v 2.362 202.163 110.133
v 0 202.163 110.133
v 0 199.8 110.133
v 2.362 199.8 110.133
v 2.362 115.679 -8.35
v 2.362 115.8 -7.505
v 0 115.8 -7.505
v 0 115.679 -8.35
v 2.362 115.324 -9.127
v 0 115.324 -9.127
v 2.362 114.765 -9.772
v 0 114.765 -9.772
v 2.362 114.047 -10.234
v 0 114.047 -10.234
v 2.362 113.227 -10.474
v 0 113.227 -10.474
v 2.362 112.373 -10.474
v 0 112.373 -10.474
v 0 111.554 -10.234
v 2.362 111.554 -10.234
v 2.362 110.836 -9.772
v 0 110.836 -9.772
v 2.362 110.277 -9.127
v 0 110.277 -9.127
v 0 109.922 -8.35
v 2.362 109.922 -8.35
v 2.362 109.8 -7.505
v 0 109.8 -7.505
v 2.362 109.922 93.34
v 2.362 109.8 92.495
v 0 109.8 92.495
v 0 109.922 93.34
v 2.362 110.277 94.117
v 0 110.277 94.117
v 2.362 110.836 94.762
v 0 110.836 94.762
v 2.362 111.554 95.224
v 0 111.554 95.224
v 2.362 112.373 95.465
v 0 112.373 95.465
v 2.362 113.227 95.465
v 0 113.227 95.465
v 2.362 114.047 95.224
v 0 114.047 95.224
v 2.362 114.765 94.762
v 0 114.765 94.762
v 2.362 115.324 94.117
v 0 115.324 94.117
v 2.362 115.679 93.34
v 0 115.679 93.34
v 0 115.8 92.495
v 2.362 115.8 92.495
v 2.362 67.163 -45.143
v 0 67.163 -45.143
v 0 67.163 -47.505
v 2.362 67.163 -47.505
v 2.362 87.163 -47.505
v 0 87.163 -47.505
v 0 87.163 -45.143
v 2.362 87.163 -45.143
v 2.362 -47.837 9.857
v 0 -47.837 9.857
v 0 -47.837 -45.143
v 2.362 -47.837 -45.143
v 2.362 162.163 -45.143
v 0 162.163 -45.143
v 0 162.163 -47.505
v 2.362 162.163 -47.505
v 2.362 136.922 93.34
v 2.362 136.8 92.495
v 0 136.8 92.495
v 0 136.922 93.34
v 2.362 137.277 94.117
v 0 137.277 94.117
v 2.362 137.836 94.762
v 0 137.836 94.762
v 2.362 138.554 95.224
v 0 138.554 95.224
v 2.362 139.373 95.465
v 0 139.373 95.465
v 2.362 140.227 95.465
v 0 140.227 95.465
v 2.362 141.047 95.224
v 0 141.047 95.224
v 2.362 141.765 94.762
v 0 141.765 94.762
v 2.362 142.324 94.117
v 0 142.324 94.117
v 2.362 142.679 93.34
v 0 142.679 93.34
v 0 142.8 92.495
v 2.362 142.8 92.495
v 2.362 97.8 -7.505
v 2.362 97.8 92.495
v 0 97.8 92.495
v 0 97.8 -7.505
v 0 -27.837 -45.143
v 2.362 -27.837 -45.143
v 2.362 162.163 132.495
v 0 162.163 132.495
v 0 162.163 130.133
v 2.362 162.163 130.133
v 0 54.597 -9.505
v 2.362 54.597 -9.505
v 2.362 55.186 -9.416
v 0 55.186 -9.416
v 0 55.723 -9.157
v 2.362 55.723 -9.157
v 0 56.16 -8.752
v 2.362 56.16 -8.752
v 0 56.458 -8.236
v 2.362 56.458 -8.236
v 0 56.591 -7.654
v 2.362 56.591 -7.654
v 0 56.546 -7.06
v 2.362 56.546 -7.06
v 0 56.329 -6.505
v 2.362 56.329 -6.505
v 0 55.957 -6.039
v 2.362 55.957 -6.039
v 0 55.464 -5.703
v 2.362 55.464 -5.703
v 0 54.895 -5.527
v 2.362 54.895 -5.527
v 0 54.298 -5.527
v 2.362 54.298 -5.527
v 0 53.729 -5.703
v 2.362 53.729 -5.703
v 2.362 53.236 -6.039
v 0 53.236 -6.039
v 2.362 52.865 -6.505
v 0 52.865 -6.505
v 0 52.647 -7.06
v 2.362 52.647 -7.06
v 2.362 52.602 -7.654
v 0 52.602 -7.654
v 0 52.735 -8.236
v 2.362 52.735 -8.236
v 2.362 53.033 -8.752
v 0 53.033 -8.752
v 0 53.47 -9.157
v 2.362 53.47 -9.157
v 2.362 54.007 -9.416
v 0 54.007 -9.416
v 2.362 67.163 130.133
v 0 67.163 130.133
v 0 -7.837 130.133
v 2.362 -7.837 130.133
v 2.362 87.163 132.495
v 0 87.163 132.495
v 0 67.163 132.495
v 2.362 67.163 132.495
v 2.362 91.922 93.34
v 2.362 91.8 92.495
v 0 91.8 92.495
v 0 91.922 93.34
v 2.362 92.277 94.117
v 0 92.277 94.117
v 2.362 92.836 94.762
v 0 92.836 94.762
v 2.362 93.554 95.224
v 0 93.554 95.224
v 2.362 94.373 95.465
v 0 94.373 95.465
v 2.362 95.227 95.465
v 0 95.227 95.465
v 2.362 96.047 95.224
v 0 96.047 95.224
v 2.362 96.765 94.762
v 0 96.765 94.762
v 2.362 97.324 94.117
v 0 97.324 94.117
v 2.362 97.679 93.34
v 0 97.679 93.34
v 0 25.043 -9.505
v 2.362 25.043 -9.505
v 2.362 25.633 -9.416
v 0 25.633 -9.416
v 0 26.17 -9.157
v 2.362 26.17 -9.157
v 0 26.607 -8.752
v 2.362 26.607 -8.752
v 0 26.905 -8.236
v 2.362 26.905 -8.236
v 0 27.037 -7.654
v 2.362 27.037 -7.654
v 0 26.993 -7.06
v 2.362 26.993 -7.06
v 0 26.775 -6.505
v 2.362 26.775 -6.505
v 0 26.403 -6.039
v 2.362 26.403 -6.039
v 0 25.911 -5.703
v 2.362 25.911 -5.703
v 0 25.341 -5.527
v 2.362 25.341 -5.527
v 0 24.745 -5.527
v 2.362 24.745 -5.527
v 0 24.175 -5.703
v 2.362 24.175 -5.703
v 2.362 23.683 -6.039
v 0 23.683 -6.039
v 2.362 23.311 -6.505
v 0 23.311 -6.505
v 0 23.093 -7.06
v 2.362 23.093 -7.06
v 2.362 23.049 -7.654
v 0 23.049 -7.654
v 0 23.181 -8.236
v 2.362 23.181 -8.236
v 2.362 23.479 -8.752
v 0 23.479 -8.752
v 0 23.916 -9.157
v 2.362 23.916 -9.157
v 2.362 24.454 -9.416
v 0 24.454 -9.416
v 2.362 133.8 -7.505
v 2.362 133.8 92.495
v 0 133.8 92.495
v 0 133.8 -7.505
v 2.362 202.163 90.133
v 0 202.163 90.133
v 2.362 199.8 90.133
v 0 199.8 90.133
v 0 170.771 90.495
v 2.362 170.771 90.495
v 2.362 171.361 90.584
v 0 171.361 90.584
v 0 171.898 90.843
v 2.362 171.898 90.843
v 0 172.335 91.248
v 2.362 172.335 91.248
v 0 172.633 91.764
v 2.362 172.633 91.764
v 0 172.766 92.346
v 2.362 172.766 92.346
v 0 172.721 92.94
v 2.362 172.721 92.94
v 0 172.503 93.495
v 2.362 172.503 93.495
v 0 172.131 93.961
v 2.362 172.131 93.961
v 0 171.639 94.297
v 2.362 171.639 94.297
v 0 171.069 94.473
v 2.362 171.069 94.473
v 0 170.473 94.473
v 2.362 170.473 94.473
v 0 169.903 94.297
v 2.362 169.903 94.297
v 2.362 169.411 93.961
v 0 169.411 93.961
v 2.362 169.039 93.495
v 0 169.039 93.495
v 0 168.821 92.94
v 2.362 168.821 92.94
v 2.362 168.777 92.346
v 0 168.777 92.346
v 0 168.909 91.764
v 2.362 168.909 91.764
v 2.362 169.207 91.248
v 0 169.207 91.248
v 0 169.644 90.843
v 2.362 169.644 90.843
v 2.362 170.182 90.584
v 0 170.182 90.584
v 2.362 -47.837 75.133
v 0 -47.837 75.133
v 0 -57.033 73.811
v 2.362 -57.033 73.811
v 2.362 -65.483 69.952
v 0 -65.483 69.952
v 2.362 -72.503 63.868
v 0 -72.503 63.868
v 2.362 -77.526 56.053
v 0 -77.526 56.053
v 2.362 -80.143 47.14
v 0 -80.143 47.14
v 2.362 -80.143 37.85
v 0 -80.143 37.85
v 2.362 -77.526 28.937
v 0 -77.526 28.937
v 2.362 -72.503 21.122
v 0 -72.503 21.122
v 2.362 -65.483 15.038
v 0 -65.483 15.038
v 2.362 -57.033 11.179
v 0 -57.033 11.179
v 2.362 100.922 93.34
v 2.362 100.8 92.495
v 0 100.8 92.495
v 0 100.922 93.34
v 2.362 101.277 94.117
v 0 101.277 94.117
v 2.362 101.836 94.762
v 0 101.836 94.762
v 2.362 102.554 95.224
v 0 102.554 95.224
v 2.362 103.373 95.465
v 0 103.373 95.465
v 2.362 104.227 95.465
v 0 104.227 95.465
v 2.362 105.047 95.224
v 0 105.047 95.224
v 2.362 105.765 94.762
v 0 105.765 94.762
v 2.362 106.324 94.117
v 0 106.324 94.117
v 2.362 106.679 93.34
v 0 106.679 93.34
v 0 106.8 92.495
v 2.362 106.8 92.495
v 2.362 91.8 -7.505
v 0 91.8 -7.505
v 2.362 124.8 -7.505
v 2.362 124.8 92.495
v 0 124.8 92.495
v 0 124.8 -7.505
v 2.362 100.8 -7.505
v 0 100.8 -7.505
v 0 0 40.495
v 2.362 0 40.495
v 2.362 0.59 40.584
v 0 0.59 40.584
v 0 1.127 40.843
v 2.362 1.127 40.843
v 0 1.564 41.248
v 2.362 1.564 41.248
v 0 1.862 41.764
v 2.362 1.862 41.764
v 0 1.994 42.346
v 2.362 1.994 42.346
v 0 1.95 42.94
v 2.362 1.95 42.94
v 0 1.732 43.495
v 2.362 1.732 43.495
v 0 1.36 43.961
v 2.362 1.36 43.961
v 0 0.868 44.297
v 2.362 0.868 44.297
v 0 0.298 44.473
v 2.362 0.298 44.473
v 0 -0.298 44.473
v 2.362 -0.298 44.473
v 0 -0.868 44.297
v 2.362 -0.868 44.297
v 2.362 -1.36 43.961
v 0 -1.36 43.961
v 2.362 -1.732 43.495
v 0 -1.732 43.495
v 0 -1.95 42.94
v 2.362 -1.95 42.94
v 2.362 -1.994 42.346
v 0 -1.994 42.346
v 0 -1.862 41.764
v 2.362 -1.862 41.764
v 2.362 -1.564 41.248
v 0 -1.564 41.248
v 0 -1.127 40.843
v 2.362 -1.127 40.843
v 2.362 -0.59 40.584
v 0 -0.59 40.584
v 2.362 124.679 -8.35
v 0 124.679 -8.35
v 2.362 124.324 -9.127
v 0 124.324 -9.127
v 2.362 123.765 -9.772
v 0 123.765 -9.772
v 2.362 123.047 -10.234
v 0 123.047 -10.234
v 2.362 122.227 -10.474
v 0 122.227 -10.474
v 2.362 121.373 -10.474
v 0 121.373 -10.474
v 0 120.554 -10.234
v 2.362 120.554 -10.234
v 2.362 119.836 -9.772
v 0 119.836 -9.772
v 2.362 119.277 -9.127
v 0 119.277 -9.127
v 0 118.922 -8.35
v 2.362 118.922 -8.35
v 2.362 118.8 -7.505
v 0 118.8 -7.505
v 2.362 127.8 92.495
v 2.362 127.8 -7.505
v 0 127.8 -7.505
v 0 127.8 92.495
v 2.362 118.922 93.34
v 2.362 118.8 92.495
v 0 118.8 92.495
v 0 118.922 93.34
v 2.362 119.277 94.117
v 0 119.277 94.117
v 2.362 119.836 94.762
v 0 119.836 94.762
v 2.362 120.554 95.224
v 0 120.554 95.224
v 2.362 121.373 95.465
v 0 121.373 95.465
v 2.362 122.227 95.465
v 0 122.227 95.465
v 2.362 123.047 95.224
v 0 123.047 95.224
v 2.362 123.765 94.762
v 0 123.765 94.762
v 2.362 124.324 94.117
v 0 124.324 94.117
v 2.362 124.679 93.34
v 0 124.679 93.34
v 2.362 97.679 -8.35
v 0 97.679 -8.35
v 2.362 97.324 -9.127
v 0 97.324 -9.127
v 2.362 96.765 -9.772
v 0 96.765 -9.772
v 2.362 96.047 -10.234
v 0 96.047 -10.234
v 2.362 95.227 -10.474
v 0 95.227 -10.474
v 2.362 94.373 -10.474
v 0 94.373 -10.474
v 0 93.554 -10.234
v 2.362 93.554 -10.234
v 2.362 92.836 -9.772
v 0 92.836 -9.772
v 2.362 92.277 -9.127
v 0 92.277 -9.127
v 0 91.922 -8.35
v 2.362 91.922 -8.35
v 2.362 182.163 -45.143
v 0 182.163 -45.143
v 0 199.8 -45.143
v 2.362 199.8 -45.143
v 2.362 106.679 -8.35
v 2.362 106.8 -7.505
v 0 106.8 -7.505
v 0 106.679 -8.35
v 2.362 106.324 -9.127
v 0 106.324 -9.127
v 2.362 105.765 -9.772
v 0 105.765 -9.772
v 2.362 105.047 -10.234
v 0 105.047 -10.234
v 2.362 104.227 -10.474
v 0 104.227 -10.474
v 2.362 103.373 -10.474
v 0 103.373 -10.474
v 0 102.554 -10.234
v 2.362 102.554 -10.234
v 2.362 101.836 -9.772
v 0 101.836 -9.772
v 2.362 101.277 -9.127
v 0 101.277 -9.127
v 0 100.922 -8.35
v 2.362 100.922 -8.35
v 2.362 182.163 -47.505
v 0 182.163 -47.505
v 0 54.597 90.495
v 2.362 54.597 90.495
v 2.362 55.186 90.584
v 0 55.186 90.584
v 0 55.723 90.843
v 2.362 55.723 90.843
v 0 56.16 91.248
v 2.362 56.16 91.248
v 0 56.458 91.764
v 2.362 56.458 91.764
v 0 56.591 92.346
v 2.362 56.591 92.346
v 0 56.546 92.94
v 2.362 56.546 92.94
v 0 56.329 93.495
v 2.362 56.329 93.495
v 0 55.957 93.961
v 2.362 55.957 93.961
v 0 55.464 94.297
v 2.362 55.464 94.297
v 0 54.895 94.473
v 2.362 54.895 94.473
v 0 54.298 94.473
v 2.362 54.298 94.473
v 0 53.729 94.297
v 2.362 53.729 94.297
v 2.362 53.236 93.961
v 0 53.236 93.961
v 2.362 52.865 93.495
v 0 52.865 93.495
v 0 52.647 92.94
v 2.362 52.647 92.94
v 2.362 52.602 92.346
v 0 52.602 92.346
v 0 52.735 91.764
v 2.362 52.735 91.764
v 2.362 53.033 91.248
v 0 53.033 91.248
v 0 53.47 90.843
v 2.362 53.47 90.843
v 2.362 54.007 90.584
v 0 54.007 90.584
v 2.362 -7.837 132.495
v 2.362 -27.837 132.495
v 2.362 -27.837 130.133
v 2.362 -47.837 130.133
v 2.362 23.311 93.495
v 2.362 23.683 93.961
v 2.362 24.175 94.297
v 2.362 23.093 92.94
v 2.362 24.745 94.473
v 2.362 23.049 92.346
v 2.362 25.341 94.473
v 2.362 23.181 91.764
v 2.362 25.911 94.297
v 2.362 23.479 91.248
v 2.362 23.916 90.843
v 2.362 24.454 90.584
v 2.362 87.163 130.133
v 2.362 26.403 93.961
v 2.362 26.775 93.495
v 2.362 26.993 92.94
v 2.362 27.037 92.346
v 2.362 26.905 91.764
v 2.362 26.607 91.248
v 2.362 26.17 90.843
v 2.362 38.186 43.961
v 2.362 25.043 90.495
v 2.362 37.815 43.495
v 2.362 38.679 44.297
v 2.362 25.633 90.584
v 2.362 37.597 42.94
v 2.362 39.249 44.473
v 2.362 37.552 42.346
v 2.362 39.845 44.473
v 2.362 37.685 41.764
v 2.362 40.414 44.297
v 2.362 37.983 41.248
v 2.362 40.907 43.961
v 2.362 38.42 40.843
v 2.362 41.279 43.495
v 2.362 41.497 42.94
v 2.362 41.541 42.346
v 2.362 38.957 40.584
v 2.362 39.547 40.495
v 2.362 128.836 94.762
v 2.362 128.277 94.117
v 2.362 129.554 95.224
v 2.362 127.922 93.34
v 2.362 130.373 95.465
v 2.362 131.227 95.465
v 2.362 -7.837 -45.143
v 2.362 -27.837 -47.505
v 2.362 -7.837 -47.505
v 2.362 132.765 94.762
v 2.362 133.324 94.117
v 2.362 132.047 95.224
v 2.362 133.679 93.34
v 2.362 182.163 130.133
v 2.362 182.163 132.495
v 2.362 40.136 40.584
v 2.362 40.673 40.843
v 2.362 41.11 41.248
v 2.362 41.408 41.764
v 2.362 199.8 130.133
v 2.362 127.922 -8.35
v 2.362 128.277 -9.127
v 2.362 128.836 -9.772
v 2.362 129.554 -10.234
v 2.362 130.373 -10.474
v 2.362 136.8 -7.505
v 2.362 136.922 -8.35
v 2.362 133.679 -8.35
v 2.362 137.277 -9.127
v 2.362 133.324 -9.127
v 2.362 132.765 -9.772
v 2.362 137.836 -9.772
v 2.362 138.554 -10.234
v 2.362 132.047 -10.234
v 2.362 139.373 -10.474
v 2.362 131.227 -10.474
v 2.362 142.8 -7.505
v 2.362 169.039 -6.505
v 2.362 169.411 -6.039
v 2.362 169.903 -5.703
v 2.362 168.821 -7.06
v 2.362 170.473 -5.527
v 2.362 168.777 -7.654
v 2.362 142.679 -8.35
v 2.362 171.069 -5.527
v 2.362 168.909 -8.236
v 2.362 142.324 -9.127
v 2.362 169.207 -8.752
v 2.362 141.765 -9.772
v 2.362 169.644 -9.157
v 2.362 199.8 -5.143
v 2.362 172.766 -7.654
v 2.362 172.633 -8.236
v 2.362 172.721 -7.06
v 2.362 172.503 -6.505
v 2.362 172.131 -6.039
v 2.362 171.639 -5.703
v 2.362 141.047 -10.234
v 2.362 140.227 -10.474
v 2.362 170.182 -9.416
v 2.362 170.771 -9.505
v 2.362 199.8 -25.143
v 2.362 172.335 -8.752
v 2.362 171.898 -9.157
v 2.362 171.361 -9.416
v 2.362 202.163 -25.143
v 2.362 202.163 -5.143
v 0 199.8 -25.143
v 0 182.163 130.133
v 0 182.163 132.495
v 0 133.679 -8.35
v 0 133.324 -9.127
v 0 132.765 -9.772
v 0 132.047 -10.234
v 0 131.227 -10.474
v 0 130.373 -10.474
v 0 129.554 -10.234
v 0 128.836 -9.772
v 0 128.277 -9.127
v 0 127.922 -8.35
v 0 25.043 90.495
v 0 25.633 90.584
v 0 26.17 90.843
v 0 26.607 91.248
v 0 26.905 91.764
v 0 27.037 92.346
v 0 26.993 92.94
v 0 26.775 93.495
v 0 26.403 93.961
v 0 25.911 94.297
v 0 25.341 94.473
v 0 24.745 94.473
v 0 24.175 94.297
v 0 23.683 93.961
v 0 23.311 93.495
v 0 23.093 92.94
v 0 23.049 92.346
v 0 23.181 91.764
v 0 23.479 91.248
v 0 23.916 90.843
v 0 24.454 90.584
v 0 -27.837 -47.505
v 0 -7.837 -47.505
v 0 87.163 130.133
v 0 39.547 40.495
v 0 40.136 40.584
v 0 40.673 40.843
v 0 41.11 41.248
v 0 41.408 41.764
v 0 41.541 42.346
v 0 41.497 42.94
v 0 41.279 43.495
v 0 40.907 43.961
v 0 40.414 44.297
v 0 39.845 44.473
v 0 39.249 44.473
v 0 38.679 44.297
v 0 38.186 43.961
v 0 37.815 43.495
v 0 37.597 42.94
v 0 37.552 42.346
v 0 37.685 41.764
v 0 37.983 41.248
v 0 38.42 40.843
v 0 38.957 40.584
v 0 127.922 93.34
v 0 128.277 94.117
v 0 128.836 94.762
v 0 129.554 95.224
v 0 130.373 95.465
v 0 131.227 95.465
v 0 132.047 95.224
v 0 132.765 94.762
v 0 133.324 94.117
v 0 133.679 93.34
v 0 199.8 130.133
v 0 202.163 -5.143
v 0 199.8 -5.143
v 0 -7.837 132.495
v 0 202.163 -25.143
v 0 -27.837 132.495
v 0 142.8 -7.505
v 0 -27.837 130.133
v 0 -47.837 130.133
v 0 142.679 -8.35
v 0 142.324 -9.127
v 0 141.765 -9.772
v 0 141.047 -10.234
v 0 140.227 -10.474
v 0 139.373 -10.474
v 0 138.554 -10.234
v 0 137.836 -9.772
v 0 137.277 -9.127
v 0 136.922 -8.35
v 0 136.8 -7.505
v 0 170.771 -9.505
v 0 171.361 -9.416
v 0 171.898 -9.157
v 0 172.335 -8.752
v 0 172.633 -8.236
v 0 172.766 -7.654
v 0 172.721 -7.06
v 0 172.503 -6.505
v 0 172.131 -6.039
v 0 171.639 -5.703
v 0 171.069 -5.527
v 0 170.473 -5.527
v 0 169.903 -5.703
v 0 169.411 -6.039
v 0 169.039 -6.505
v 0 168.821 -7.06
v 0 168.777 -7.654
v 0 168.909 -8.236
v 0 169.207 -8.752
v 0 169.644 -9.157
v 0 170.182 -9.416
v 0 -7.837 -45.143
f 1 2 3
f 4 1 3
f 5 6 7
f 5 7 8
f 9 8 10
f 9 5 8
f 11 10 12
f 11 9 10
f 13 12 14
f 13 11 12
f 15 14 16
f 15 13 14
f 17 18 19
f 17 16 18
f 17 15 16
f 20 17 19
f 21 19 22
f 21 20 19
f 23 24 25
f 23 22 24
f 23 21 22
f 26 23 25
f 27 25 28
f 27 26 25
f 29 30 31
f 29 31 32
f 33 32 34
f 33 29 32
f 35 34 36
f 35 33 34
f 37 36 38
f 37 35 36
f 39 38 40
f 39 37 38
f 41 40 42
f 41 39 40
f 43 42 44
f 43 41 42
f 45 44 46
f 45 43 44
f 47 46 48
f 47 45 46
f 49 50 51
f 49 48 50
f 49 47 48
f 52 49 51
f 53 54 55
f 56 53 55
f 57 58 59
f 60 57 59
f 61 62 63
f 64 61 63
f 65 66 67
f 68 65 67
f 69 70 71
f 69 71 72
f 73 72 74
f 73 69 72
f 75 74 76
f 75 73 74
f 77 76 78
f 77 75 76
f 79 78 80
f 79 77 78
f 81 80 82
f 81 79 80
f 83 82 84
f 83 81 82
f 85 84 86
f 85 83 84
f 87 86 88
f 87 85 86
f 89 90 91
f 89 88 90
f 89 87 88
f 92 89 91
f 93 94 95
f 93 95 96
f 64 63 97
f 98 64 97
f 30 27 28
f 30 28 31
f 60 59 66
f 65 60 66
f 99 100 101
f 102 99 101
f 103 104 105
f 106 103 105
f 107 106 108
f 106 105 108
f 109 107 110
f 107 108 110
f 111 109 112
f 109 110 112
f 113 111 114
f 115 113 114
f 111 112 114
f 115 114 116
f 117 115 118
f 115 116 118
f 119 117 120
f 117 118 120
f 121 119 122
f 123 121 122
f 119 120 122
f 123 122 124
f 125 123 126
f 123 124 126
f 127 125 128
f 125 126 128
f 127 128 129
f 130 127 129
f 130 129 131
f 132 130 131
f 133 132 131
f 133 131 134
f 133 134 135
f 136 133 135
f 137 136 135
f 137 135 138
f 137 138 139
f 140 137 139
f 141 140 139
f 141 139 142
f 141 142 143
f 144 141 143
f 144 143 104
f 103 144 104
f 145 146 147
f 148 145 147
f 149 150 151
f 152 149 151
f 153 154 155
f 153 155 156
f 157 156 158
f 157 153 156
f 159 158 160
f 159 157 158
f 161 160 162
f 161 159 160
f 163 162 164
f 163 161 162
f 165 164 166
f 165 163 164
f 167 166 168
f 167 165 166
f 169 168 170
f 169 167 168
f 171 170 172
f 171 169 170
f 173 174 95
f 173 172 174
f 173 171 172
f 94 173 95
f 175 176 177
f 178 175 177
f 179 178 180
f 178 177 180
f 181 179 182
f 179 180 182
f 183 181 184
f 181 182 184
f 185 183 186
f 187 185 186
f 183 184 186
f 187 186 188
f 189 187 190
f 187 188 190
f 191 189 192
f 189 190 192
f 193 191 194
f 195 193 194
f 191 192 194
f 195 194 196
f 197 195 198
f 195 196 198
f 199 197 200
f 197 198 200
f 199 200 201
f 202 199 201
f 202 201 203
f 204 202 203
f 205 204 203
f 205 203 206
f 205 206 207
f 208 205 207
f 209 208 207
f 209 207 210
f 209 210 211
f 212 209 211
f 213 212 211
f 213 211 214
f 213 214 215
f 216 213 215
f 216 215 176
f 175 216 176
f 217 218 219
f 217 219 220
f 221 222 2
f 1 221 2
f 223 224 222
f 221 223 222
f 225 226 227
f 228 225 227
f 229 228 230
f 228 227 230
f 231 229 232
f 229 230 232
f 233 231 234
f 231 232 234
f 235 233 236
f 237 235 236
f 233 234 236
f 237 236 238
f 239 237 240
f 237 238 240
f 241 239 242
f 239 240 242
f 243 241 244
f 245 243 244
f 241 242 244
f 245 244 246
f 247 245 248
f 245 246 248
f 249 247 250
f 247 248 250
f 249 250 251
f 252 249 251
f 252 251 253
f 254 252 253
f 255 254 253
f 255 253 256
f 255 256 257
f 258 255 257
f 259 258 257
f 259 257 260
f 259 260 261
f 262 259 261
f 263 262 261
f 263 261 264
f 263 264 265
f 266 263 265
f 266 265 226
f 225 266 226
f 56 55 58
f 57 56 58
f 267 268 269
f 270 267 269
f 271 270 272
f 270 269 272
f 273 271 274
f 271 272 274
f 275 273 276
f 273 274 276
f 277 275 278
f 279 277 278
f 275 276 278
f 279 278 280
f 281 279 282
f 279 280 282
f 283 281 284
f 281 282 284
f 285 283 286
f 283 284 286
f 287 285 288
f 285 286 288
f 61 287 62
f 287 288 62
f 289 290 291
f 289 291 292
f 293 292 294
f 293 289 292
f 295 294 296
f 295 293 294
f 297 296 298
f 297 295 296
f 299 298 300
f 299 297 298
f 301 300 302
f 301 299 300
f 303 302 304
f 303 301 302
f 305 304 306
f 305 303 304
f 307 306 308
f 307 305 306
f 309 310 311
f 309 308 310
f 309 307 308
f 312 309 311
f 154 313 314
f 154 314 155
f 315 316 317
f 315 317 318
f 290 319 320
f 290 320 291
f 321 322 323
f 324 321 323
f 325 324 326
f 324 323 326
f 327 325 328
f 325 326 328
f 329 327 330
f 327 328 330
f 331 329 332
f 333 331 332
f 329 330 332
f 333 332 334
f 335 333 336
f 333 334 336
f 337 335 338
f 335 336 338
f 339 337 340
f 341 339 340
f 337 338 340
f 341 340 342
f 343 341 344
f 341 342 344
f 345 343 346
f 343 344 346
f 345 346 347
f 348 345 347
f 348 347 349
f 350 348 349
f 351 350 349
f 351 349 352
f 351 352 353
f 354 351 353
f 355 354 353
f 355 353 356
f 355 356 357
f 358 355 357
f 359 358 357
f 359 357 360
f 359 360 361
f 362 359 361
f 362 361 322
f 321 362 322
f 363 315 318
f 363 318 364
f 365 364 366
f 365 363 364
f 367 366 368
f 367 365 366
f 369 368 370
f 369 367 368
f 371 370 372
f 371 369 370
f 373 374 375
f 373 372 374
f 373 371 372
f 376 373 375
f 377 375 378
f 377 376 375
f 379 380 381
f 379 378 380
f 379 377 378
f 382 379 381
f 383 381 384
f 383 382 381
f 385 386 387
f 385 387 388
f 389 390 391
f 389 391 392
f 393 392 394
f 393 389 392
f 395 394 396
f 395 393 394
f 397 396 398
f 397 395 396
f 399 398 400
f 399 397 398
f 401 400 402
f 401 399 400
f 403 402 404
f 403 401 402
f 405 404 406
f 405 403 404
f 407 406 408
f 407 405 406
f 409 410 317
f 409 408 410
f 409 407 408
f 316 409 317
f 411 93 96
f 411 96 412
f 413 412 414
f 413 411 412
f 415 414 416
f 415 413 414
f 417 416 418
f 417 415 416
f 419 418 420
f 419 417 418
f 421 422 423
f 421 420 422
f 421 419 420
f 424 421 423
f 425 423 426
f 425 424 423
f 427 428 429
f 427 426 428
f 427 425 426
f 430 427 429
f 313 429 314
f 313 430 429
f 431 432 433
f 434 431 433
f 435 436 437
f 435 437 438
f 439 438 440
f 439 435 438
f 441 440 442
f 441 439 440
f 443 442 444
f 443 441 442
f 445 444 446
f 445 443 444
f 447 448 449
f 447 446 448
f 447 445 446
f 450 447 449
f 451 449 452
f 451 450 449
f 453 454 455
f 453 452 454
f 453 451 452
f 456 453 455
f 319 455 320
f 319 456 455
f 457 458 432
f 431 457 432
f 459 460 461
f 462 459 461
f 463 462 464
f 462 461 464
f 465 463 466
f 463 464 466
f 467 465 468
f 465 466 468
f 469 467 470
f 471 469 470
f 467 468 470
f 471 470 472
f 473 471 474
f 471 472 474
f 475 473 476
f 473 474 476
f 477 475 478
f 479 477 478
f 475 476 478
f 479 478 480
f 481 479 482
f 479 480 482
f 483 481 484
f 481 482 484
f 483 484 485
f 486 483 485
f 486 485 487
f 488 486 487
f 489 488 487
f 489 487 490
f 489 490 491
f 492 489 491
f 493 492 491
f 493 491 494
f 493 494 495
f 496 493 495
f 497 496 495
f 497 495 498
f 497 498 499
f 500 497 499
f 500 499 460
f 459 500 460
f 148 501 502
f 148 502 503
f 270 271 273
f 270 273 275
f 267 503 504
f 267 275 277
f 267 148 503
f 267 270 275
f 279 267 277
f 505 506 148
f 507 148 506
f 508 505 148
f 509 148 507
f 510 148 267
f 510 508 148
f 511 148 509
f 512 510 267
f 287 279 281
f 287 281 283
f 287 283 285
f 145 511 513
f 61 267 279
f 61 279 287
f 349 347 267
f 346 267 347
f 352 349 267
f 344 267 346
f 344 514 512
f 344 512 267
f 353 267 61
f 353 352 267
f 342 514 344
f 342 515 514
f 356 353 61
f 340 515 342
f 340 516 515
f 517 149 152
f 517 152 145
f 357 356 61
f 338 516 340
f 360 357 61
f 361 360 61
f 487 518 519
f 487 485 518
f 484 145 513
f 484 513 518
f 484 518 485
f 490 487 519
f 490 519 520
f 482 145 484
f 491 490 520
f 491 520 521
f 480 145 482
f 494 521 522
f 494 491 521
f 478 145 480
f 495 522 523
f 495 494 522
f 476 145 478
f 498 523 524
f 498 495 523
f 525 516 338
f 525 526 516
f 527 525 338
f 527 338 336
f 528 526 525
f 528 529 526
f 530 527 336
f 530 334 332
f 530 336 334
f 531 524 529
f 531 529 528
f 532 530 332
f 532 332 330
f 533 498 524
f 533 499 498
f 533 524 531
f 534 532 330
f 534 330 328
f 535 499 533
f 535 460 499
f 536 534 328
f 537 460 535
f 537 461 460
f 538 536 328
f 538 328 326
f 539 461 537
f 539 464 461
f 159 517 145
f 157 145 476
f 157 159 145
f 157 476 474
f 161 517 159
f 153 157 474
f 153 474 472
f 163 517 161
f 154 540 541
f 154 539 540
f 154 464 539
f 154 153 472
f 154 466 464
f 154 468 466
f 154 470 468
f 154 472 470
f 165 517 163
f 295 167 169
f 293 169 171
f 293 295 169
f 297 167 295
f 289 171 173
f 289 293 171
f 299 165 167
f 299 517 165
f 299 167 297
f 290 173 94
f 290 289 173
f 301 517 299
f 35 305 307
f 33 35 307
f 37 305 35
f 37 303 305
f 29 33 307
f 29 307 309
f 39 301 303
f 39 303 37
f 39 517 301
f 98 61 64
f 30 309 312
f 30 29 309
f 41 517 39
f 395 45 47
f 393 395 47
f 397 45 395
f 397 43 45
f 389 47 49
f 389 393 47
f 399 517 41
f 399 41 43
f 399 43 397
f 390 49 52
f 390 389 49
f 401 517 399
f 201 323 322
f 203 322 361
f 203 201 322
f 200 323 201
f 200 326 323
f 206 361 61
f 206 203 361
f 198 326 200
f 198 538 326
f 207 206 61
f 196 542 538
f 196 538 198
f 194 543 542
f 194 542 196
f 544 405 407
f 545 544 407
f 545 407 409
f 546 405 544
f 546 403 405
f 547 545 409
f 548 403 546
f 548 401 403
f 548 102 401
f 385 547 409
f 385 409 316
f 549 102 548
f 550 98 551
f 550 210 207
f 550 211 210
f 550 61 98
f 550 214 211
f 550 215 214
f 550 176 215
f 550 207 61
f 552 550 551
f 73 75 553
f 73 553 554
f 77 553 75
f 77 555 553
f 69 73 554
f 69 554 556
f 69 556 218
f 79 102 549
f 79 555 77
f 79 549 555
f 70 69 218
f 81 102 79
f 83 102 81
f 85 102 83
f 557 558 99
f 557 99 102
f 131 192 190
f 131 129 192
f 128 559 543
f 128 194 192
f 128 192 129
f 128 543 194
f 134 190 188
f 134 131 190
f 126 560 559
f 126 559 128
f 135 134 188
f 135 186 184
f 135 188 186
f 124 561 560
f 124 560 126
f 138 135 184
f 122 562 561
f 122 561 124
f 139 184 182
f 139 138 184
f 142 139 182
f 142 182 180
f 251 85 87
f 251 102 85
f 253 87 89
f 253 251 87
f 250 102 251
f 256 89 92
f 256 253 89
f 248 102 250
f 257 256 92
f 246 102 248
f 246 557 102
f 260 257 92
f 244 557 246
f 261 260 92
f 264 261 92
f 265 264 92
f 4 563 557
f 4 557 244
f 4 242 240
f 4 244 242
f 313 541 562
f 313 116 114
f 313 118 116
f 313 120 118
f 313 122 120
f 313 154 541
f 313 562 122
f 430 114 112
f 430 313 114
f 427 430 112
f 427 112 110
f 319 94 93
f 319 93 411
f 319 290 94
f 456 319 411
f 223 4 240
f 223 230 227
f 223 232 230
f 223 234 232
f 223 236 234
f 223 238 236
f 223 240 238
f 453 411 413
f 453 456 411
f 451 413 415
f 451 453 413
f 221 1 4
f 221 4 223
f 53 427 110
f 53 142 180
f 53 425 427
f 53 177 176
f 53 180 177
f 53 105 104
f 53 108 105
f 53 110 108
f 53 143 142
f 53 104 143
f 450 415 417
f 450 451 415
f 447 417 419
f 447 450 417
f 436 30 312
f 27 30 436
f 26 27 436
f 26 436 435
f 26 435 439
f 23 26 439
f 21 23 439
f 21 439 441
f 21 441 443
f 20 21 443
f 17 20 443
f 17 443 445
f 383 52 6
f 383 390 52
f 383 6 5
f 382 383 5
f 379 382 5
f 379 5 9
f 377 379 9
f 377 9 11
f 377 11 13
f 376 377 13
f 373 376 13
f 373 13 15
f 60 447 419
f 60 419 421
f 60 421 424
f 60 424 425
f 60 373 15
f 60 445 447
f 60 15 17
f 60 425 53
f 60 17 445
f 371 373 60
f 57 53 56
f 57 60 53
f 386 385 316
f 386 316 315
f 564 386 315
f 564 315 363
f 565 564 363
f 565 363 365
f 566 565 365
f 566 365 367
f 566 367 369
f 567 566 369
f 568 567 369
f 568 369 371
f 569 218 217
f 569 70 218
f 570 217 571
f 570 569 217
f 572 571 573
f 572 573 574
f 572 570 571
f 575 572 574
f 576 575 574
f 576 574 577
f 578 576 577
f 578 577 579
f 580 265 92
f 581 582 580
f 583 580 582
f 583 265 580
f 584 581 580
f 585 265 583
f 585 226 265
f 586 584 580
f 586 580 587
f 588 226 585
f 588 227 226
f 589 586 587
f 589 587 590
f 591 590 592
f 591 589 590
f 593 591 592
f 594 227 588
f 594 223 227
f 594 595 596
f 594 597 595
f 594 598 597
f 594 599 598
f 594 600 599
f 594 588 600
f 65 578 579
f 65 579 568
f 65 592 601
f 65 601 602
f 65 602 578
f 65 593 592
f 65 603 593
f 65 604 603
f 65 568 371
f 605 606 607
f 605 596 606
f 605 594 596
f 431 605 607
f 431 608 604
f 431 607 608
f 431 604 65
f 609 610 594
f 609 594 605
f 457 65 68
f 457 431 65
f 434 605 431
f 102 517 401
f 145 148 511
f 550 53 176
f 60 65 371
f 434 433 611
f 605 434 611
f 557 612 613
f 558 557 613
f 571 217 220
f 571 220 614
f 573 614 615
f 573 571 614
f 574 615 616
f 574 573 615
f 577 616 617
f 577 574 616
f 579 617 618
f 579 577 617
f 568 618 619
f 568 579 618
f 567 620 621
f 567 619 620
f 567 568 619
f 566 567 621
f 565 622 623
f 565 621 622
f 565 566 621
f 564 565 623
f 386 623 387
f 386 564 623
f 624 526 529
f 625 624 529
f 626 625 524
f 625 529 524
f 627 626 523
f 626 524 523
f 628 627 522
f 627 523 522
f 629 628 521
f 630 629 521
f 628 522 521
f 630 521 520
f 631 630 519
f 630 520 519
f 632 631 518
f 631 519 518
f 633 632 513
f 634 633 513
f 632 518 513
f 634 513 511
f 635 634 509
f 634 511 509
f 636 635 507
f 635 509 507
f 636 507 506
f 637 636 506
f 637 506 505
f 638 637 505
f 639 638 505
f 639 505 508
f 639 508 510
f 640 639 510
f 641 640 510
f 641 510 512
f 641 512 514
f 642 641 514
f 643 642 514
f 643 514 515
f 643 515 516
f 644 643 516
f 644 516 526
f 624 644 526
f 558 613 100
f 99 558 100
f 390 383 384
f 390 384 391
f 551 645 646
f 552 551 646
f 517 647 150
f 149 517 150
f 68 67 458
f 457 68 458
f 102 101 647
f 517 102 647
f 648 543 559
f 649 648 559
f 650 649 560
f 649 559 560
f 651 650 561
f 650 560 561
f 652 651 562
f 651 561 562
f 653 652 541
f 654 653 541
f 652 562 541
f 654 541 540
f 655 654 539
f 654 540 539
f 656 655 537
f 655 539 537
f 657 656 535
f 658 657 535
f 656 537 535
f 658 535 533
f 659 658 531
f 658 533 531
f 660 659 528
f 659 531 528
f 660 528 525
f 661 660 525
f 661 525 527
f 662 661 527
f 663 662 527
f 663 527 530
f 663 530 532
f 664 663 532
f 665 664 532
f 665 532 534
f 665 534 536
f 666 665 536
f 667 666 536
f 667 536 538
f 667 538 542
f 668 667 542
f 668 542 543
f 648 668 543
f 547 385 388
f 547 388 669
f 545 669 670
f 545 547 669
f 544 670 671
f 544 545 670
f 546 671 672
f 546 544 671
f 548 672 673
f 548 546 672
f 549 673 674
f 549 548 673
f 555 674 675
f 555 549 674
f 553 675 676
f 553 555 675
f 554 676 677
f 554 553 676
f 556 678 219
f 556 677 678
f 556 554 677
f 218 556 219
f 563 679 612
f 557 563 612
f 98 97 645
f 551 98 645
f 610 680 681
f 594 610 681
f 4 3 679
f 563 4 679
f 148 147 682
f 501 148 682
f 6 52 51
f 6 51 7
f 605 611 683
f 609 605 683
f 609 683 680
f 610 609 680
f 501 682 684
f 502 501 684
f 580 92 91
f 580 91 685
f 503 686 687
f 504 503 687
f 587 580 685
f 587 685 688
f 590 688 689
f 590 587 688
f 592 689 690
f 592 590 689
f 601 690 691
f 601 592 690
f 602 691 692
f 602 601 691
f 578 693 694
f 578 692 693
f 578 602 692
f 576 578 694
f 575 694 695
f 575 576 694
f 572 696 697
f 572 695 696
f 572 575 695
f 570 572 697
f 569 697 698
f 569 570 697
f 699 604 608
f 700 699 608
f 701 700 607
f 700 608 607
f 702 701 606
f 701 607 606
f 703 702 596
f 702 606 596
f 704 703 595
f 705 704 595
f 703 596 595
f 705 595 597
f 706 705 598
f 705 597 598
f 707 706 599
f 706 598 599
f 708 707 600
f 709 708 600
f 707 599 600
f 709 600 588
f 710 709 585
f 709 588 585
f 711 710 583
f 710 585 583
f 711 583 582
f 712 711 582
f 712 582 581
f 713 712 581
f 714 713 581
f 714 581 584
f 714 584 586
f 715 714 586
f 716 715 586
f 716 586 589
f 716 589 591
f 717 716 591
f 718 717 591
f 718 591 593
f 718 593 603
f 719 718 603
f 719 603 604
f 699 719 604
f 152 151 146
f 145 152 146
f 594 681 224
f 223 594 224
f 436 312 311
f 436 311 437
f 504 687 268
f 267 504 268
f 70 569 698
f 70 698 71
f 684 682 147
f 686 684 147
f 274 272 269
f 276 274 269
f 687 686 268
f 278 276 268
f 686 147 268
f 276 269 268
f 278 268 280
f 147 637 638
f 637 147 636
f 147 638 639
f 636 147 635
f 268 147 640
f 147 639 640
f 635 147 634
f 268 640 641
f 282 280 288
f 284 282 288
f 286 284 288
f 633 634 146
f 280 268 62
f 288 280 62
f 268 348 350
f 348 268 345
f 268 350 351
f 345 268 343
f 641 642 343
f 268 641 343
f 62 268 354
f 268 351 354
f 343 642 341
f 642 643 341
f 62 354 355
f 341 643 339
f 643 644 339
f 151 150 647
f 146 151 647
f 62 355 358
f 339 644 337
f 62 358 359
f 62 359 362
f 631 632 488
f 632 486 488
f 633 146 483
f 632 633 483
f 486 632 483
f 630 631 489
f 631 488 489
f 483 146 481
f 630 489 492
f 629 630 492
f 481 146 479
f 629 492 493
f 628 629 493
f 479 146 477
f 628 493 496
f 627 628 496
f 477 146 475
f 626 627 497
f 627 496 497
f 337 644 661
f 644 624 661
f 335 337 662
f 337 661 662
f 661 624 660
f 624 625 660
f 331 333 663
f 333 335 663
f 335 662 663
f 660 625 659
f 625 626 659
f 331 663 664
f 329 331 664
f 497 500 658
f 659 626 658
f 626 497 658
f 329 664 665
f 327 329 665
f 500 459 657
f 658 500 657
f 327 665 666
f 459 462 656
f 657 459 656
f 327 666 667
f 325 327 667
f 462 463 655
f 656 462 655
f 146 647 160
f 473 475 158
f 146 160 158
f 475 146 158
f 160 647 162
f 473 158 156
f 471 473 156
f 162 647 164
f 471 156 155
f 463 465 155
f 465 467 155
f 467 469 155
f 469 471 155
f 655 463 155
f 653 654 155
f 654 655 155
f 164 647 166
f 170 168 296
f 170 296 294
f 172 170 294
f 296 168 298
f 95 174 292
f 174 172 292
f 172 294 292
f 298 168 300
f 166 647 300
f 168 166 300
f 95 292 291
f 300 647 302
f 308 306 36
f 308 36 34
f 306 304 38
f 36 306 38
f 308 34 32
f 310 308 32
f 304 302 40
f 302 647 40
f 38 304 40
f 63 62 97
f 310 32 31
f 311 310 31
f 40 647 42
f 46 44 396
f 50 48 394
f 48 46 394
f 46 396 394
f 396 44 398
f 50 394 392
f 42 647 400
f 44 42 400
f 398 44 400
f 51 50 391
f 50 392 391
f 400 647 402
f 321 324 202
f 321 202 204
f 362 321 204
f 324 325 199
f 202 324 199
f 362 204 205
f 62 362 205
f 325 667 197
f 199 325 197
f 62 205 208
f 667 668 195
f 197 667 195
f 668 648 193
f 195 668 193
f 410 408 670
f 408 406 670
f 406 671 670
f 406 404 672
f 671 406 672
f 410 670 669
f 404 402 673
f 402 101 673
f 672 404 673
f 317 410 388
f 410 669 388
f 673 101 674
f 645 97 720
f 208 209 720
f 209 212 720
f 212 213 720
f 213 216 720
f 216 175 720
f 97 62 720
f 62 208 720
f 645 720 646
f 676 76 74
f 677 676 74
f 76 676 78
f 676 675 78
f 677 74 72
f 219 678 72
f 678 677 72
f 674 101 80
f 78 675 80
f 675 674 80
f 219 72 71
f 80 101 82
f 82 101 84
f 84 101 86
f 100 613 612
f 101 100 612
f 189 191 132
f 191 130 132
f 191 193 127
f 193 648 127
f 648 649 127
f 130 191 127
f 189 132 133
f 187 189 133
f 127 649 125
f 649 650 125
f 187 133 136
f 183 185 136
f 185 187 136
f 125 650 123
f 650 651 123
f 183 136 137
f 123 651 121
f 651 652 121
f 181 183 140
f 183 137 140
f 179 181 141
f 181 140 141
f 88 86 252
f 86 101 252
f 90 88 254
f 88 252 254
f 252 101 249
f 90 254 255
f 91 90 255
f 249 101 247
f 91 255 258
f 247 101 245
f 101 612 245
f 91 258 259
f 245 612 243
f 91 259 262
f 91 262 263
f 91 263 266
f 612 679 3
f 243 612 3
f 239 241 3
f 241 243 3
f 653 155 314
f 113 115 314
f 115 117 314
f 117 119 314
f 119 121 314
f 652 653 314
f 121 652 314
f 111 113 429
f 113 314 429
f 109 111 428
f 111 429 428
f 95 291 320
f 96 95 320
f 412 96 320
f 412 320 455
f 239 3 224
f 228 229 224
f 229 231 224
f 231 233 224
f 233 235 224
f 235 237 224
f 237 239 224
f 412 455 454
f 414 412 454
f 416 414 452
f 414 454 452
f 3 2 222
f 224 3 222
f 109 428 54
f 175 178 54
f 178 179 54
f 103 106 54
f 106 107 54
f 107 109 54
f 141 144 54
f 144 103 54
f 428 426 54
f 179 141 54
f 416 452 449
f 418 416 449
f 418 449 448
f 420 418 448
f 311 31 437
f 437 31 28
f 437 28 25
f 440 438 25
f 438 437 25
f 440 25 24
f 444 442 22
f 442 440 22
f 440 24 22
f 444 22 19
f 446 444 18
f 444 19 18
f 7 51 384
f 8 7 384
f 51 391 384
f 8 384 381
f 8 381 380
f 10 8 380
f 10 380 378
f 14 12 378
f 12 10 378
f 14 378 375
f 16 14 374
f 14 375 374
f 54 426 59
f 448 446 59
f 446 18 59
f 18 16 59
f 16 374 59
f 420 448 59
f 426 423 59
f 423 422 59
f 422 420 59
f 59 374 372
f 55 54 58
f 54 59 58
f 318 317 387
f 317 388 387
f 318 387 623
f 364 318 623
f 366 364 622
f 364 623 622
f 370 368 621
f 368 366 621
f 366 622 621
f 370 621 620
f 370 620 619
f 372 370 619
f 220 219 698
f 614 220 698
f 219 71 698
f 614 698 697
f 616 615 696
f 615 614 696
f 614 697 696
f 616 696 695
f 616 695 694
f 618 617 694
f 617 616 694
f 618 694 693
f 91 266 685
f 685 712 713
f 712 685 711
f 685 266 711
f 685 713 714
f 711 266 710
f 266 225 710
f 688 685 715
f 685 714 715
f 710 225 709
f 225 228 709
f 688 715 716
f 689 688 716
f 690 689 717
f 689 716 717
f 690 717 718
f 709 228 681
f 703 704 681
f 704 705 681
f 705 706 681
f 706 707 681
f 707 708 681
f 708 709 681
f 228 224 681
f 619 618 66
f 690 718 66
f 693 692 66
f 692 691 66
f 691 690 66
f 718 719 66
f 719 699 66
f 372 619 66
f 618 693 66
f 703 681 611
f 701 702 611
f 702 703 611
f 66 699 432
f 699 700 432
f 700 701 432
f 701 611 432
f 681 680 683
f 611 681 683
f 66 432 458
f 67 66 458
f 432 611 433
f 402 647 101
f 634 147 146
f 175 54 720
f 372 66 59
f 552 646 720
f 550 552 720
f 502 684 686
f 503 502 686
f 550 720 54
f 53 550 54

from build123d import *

# Parameters (mm, degrees)
BOSS_EXTRUDE1_DEPTH = 2.3622
SKETCH2_R           = 2
CUT_EXTRUDE1_DEPTH  = 242.723455562


with BuildPart() as part:
    # Sketch1 → Boss-Extrude1 (new body)
    with BuildSketch(Plane(origin=(0, 0, 0), x_dir=(0, 0, -1), z_dir=(1, 0, 0))):
        with BuildLine():
            Line((-130.13293856, 199.80032679), (-130.13293856, 182.16252679))
            Line((-130.13293856, 182.16252679), (-132.49513856, 182.16252679))
            Line((-132.49513856, 182.16252679), (-132.49513856, 162.16252679))
            Line((-132.49513856, 162.16252679), (-130.13293856, 162.16252679))
            Line((-130.13293856, 162.16252679), (-130.13293856, 87.16252679))
            Line((-130.13293856, 87.16252679), (-132.49513856, 87.16252679))
            Line((-132.49513856, 87.16252679), (-132.49513856, 67.16252679))
            Line((-132.49513856, 67.16252679), (-130.13293856, 67.16252679))
            Line((-130.13293856, 67.16252679), (-130.13293856, -7.83747321))
            Line((-130.13293856, -7.83747321), (-132.49513856, -7.83747321))
            Line((-132.49513856, -7.83747321), (-132.49513856, -27.83747321))
            Line((-132.49513856, -27.83747321), (-130.13293856, -27.83747321))
            Line((-130.13293856, -27.83747321), (-130.13293856, -47.83747321))
            Line((-130.13293856, -47.83747321), (-75.13293856, -47.83747321))
            ThreePointArc((-75.13293856, -47.83747321), (-42.49513856, -80.47527321), (-9.85733856, -47.83747321))
            Line((-9.85733856, -47.83747321), (45.14266144, -47.83747321))
            Line((45.14266144, -47.83747321), (45.14266144, -27.83747321))
            Line((45.14266144, -27.83747321), (47.50486144, -27.83747321))
            Line((47.50486144, -27.83747321), (47.50486144, -7.83747321))
            Line((47.50486144, -7.83747321), (45.14266144, -7.83747321))
            Line((45.14266144, -7.83747321), (45.14266144, 67.16252679))
            Line((45.14266144, 67.16252679), (47.50486144, 67.16252679))
            Line((47.50486144, 67.16252679), (47.50486144, 87.16252679))
            Line((47.50486144, 87.16252679), (45.14266144, 87.16252679))
            Line((45.14266144, 87.16252679), (45.14266144, 162.16252679))
            Line((45.14266144, 162.16252679), (47.50486144, 162.16252679))
            Line((47.50486144, 162.16252679), (47.50486144, 182.16252679))
            Line((47.50486144, 182.16252679), (45.14266144, 182.16252679))
            Line((45.14266144, 182.16252679), (45.14266144, 199.80032679))
            Line((45.14266144, 199.80032679), (25.14266144, 199.80032679))
            Line((25.14266144, 199.80032679), (25.14266144, 202.16252679))
            Line((25.14266144, 202.16252679), (5.14266144, 202.16252679))
            Line((5.14266144, 202.16252679), (5.14266144, 199.80032679))
            Line((5.14266144, 199.80032679), (-90.13293856, 199.80032679))
            Line((-90.13293856, 199.80032679), (-90.13293856, 202.16252679))
            Line((-90.13293856, 202.16252679), (-110.13293856, 202.16252679))
            Line((-110.13293856, 202.16252679), (-110.13293856, 199.80032679))
            Line((-110.13293856, 199.80032679), (-130.13293856, 199.80032679))
        make_face()
    extrude(amount=BOSS_EXTRUDE1_DEPTH)

    # Sketch2 → Cut-Extrude1 (cut, through all)
    with BuildSketch(Plane(origin=(2.3622, 0, 0), x_dir=(0, 0, -1), z_dir=(1, 0, 0))):
        with Locations((-92.49513856, 54.59655139)):
            Circle(SKETCH2_R)
        with Locations((7.50486144, 54.59655139)):
            Circle(SKETCH2_R)
        with Locations((7.50486144, 25.043037435)):
            Circle(SKETCH2_R)
        with Locations((-92.49513856, 170.771110124)):
            Circle(SKETCH2_R)
        with Locations((7.50486144, 170.771110124)):
            Circle(SKETCH2_R)
        with Locations((-92.49513856, 25.043037435)):
            Circle(SKETCH2_R)
        with Locations((-42.49513856, 39.546662347)):
            Circle(SKETCH2_R)
        with Locations((-42.49513856, 0)):
            Circle(SKETCH2_R)
        with BuildLine():
            Line((-92.49513856, 142.80032679), (7.50486144, 142.80032679))
            ThreePointArc((7.50486144, 142.80032679), (10.50486144, 139.80032679), (7.50486144, 136.80032679))
            Line((7.50486144, 136.80032679), (-92.49513856, 136.80032679))
            ThreePointArc((-92.49513856, 136.80032679), (-95.49513856, 139.80032679), (-92.49513856, 142.80032679))
        make_face()
        with BuildLine():
            Line((-92.49513856, 133.80032679), (7.50486144, 133.80032679))
            ThreePointArc((7.50486144, 133.80032679), (10.50486144, 130.80032679), (7.50486144, 127.80032679))
            Line((7.50486144, 127.80032679), (-92.49513856, 127.80032679))
            ThreePointArc((-92.49513856, 127.80032679), (-95.49513856, 130.80032679), (-92.49513856, 133.80032679))
        make_face()
        with BuildLine():
            Line((-92.49513856, 124.80032679), (7.50486144, 124.80032679))
            ThreePointArc((7.50486144, 124.80032679), (10.50486144, 121.80032679), (7.50486144, 118.80032679))
            Line((7.50486144, 118.80032679), (-92.49513856, 118.80032679))
            ThreePointArc((-92.49513856, 118.80032679), (-95.49513856, 121.80032679), (-92.49513856, 124.80032679))
        make_face()
        with BuildLine():
            Line((-92.49513856, 115.80032679), (7.50486144, 115.80032679))
            ThreePointArc((7.50486144, 115.80032679), (10.50486144, 112.80032679), (7.50486144, 109.80032679))
            Line((7.50486144, 109.80032679), (-92.49513856, 109.80032679))
            ThreePointArc((-92.49513856, 109.80032679), (-95.49513856, 112.80032679), (-92.49513856, 115.80032679))
        make_face()
        with BuildLine():
            Line((-92.49513856, 106.80032679), (7.50486144, 106.80032679))
            ThreePointArc((7.50486144, 106.80032679), (10.50486144, 103.80032679), (7.50486144, 100.80032679))
            Line((7.50486144, 100.80032679), (-92.49513856, 100.80032679))
            ThreePointArc((-92.49513856, 100.80032679), (-95.49513856, 103.80032679), (-92.49513856, 106.80032679))
        make_face()
        with BuildLine():
            Line((-92.49513856, 97.80032679), (7.50486144, 97.80032679))
            ThreePointArc((7.50486144, 97.80032679), (10.50486144, 94.80032679), (7.50486144, 91.80032679))
            Line((7.50486144, 91.80032679), (-92.49513856, 91.80032679))
            ThreePointArc((-92.49513856, 91.80032679), (-95.49513856, 94.80032679), (-92.49513856, 97.80032679))
        make_face()
    extrude(amount=-CUT_EXTRUDE1_DEPTH, mode=Mode.SUBTRACT)


solid = part.part
